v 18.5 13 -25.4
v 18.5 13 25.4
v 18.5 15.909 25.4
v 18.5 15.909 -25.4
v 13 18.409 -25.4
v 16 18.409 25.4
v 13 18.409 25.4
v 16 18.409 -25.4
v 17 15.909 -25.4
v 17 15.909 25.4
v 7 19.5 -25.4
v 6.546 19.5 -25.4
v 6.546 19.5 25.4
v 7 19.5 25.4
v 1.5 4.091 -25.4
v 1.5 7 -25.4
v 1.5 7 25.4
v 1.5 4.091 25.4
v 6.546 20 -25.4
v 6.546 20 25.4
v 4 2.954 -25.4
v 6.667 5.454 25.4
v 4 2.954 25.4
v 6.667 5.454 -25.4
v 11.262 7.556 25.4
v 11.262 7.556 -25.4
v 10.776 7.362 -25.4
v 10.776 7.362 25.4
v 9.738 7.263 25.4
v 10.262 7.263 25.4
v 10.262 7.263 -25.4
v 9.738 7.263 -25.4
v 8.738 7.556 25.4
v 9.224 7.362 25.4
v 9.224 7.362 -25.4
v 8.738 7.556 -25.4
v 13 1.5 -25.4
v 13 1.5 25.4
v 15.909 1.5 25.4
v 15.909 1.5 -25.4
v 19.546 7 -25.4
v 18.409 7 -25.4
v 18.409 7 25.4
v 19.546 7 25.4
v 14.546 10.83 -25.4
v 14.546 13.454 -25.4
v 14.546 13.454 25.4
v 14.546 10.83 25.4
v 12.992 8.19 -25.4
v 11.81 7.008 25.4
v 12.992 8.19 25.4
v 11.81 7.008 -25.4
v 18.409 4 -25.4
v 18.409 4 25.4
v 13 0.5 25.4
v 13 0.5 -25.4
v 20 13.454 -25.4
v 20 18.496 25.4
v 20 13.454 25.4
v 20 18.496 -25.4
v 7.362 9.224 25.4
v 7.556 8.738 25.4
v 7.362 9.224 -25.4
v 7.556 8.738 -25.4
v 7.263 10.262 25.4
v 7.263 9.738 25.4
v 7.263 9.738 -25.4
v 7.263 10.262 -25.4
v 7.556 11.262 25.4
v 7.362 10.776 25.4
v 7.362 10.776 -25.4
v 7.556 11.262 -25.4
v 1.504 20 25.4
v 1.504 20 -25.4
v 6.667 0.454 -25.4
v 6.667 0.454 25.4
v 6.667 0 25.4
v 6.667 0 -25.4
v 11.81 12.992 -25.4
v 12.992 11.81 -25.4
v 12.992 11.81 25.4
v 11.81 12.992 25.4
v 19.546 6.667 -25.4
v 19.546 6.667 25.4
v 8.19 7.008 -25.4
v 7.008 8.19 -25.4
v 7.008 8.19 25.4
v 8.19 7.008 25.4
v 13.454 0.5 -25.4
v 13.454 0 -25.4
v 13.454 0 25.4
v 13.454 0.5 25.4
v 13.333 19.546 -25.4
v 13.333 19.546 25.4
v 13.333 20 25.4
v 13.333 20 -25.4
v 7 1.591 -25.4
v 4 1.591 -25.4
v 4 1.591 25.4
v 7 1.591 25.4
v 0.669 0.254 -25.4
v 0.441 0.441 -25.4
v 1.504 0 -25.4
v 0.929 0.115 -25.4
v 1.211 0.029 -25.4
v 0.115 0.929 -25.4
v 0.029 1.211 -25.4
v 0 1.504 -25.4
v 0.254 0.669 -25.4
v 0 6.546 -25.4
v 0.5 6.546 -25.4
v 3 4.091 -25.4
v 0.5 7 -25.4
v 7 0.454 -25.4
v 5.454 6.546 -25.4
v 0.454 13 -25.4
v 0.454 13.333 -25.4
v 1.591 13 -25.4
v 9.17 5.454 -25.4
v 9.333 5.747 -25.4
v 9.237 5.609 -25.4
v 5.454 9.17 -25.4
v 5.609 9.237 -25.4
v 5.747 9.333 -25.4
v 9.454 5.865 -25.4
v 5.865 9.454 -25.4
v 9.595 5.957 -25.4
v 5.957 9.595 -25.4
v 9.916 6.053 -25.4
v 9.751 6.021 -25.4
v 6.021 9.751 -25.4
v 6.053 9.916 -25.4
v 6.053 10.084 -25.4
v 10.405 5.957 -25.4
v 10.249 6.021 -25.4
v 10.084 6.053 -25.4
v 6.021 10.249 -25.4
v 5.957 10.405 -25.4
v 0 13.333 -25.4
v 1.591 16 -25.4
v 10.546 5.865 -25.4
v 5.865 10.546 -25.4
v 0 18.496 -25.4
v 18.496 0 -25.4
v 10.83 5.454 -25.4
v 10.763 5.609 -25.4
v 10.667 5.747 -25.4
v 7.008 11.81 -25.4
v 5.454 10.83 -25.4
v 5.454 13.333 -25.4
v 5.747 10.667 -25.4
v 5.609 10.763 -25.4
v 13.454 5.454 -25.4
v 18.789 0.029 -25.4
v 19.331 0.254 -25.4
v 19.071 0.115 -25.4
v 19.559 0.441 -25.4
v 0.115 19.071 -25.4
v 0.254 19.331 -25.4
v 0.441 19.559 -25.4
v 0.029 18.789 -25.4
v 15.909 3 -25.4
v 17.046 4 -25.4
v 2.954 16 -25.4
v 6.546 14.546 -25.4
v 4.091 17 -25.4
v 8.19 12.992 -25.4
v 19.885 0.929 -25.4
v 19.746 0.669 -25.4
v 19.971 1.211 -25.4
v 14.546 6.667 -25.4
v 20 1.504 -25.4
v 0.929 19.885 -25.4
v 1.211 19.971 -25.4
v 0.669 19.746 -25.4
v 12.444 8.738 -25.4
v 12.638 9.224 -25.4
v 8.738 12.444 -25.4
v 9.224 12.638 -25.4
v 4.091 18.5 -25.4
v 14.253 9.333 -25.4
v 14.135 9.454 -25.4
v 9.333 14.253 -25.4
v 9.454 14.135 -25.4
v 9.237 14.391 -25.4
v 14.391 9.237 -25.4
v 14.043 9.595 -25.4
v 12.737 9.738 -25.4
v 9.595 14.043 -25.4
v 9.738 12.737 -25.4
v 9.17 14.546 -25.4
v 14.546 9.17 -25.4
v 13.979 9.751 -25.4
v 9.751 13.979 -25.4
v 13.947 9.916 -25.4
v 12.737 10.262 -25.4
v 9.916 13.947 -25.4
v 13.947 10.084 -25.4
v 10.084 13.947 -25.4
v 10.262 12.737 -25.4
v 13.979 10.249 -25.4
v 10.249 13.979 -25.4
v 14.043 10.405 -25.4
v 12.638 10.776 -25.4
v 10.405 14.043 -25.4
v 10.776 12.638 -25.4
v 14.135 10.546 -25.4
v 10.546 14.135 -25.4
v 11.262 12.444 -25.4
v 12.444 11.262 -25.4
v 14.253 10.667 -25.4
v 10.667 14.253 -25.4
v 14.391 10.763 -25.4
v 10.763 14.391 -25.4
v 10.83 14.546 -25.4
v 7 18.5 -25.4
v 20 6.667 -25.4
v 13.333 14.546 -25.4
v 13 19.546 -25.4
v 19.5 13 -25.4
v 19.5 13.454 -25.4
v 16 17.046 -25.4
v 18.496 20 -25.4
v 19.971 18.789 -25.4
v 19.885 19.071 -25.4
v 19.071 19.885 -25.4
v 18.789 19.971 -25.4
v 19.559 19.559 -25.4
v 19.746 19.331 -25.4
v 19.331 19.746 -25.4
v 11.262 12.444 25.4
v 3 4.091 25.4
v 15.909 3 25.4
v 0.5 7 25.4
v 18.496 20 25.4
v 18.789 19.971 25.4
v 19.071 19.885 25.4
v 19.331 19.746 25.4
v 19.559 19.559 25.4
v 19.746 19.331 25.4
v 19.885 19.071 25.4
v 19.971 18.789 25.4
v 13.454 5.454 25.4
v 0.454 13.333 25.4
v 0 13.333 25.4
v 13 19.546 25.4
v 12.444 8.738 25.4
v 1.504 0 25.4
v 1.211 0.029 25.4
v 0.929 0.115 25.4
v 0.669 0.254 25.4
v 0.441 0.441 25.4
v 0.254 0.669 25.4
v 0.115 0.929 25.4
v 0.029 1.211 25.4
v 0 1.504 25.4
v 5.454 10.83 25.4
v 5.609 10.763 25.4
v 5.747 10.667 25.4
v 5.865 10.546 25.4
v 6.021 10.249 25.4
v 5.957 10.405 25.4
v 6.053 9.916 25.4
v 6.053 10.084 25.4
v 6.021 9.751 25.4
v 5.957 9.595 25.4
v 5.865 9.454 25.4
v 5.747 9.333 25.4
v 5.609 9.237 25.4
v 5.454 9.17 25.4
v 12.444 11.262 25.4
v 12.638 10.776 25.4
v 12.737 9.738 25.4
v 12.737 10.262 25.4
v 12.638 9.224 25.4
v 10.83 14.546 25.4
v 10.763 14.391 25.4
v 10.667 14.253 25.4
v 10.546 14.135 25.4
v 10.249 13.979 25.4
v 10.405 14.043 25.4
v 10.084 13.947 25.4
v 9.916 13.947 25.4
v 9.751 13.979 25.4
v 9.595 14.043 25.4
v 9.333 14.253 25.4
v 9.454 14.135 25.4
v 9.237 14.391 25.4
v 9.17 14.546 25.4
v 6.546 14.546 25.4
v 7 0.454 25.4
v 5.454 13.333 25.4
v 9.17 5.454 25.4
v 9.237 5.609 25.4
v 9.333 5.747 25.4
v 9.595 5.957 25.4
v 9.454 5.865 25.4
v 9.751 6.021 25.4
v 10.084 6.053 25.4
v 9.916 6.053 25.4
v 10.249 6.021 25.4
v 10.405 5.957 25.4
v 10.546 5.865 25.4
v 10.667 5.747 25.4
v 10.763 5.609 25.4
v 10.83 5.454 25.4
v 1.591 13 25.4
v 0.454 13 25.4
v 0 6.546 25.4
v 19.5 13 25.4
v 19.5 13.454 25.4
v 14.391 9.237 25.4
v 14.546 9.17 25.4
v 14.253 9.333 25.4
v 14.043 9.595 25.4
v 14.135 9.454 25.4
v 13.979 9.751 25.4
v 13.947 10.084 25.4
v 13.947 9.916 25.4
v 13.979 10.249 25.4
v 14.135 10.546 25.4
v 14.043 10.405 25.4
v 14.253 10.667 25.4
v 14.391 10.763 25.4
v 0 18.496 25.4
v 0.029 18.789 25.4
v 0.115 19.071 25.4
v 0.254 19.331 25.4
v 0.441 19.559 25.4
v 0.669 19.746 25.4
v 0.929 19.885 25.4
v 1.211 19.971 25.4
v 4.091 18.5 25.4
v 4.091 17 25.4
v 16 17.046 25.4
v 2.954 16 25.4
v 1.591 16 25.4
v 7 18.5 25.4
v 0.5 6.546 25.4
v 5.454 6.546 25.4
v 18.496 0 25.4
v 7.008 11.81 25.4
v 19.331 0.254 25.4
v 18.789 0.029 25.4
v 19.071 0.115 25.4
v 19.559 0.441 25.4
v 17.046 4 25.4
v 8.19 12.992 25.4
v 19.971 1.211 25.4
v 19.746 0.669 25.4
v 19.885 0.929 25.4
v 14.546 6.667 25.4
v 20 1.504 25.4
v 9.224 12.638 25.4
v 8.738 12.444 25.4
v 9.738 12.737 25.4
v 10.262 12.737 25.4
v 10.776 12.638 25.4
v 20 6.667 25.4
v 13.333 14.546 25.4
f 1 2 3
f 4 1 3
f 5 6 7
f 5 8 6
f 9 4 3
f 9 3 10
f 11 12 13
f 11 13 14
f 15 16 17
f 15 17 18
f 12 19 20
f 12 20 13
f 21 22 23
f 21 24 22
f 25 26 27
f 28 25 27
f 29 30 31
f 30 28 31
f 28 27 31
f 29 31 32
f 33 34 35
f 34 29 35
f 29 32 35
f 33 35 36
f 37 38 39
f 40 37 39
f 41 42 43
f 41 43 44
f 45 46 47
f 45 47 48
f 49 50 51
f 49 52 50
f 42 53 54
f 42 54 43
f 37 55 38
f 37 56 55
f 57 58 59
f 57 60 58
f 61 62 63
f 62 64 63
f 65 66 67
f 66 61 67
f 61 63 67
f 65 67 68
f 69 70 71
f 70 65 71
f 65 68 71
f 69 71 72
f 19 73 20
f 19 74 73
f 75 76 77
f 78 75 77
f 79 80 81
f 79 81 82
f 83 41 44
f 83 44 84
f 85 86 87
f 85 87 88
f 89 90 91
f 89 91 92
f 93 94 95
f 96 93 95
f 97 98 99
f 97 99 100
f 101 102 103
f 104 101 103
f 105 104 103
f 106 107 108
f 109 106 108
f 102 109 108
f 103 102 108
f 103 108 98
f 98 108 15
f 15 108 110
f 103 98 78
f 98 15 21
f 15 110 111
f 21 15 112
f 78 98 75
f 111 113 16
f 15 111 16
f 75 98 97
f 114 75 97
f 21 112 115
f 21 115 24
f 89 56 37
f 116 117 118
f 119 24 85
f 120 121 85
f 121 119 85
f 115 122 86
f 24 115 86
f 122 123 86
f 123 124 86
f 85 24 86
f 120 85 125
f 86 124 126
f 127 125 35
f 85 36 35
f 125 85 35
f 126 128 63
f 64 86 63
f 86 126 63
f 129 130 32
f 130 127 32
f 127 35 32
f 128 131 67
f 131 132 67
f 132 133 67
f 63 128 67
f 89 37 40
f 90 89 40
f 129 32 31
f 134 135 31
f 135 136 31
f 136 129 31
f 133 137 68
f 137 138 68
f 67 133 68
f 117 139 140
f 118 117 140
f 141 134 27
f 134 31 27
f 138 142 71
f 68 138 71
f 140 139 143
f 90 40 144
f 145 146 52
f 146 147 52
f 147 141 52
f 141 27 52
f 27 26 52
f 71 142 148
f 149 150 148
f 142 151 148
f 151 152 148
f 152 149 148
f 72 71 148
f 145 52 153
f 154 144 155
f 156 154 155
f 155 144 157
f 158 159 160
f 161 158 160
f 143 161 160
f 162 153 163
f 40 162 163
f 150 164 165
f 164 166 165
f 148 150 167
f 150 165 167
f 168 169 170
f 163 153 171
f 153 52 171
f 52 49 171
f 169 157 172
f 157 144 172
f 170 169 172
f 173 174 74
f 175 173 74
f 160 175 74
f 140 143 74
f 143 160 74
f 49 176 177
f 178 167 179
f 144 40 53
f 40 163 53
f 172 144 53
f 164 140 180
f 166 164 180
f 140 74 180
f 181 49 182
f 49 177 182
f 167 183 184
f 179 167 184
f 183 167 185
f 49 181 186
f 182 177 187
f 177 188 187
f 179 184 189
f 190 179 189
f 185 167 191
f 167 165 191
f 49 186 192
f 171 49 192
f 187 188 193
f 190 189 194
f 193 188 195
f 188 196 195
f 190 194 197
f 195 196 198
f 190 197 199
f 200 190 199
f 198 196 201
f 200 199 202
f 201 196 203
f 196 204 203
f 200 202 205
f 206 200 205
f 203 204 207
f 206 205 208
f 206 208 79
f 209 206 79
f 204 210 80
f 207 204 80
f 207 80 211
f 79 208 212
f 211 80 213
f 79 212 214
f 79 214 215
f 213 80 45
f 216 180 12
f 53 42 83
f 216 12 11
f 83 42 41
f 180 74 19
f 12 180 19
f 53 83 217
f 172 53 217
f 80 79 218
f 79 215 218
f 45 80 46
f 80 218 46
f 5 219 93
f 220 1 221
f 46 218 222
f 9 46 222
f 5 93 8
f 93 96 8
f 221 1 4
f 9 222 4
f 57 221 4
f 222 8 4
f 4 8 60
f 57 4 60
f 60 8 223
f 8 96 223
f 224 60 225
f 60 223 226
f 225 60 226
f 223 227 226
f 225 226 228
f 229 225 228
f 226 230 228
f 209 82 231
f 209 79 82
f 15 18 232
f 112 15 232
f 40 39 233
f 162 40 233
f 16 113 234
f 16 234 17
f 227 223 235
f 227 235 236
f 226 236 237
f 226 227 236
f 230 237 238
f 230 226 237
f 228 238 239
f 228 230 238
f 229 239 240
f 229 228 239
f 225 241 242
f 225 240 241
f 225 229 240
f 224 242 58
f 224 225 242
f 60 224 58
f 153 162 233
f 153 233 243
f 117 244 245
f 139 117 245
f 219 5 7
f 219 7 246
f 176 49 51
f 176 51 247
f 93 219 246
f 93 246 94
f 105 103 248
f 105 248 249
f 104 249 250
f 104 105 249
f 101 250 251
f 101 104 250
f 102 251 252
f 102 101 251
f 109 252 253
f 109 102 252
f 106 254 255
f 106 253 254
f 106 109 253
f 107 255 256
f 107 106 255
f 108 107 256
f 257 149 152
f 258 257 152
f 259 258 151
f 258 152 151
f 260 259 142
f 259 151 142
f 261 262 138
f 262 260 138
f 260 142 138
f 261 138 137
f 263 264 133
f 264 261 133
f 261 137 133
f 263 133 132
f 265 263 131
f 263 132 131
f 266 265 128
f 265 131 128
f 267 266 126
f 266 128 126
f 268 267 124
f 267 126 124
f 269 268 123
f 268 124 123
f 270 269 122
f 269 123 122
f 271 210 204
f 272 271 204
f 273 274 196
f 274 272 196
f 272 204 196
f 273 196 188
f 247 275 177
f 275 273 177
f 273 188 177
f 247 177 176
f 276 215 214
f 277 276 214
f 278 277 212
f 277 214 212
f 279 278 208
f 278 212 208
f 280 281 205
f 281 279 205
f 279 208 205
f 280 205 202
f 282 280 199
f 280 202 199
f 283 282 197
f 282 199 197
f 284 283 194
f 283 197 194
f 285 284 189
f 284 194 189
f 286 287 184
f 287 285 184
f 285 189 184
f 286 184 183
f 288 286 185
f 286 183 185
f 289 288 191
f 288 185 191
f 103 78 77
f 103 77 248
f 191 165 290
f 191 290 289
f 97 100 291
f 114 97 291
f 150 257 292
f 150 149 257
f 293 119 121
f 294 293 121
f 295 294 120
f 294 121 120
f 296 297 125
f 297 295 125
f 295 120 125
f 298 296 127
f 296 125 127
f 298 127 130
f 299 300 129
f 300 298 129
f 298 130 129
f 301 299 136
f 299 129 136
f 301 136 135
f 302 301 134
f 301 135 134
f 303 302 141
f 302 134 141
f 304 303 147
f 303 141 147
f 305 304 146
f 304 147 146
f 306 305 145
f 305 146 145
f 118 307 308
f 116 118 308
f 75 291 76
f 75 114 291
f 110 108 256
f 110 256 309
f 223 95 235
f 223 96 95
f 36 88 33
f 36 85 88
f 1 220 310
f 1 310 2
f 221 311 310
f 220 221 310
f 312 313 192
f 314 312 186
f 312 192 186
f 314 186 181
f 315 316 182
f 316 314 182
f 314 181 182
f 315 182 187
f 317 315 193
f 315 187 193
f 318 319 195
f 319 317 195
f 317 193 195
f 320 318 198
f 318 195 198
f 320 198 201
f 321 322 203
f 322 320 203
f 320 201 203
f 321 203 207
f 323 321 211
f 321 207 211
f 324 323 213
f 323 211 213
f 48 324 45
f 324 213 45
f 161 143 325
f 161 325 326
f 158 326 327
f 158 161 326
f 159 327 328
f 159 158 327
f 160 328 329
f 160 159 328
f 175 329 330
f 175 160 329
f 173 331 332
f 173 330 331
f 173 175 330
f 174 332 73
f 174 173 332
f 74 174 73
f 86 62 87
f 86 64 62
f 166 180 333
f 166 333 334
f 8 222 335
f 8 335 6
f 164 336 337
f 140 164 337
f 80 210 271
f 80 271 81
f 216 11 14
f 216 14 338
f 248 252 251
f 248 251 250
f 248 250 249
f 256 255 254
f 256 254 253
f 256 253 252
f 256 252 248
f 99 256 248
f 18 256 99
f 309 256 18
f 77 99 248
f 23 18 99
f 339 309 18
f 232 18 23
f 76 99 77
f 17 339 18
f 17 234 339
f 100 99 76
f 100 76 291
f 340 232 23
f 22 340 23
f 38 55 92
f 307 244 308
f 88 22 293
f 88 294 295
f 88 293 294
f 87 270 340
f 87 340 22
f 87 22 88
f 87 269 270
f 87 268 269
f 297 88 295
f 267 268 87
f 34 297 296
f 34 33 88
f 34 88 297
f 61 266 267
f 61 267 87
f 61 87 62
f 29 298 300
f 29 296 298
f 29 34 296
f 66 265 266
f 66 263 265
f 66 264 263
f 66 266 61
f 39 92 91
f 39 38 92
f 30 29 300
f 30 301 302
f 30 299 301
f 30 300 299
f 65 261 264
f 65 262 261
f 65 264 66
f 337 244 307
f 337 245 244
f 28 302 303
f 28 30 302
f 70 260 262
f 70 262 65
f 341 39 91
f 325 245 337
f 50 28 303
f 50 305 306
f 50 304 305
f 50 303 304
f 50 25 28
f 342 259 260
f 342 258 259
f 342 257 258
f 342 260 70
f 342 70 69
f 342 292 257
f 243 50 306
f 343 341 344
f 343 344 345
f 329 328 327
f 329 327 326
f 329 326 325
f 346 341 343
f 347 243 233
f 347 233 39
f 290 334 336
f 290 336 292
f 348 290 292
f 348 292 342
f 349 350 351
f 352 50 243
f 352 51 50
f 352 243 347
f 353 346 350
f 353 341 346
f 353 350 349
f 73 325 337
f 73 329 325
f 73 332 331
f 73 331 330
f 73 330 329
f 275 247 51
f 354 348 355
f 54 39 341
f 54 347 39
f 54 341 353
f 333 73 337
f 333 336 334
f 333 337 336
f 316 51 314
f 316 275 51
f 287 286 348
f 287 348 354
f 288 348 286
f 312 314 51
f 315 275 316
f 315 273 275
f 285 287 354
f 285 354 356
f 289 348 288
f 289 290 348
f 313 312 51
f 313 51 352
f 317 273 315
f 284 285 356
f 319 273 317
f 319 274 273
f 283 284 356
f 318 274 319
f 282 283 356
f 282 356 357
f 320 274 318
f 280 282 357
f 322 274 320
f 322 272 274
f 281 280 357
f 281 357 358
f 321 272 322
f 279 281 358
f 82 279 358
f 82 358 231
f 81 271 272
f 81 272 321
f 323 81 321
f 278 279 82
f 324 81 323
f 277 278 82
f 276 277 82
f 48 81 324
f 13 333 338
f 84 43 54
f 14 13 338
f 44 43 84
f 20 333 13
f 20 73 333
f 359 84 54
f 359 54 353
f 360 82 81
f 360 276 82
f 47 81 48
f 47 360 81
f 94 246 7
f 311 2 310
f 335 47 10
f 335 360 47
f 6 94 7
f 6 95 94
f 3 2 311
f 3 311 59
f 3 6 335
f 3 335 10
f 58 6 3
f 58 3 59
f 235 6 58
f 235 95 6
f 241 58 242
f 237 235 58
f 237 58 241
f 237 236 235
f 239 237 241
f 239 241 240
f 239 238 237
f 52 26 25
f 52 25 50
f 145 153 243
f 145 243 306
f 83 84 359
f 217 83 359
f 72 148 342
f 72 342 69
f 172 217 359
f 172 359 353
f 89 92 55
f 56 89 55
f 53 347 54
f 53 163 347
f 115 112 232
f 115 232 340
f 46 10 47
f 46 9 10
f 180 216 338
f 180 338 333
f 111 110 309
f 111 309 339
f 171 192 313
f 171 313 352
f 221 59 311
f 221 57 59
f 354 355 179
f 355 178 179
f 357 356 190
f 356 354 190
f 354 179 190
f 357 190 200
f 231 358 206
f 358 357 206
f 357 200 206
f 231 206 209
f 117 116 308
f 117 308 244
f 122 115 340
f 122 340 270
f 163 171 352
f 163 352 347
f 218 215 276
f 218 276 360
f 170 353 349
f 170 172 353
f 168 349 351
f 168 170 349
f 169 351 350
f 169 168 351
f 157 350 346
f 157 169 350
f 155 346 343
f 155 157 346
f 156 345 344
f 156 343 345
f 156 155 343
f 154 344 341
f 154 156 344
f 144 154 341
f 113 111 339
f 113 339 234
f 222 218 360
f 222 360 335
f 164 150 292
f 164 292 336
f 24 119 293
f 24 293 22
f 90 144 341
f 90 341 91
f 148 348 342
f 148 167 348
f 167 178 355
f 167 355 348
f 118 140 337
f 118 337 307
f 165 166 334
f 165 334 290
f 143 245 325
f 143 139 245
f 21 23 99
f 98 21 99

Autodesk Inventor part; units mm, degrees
sketch "Sketch1" plane through (0, 0, 0) normal (0, 0, 1) x (1, 0, 0)
  line L0 (11.2616, 7.5565) -> (11.8104, 7.0077)
  line L1 (11.8104, 7.0077) -> (12.9923, 8.1896)
  line L2 (12.9923, 8.1896) -> (12.4435, 8.7384)
  arc A0 (12.4435, 8.7384) -> (12.4435, 11.2616) centre (10, 10) ccw
  line L3 (12.4435, 11.2616) -> (12.9923, 11.8104)
  line L4 (12.9923, 11.8104) -> (11.8104, 12.9923)
  line L5 (11.8104, 12.9923) -> (11.2616, 12.4435)
  arc A1 (11.2616, 12.4435) -> (8.7384, 12.4435) centre (10, 10) ccw
  line L6 (8.7384, 12.4435) -> (8.1896, 12.9923)
  line L7 (8.1896, 12.9923) -> (7.0077, 11.8104)
  line L8 (7.0077, 11.8104) -> (7.5565, 11.2616)
  arc A2 (7.5565, 11.2616) -> (7.5565, 8.7384) centre (10, 10) ccw
  line L9 (7.5565, 8.7384) -> (7.0077, 8.1896)
  line L10 (7.0077, 8.1896) -> (8.1896, 7.0077)
  line L11 (8.1896, 7.0077) -> (8.7384, 7.5565)
  arc A3 (8.7384, 7.5565) -> (11.2616, 7.5565) centre (10, 10) ccw
  line L12 (13.4545, 0) -> (13.4545, 0.5)
  line L13 (13.4545, 0.5) -> (13, 0.5)
  line L14 (13, 0.5) -> (13, 1.5)
  line L15 (13, 1.5) -> (15.9091, 1.5)
  line L16 (15.9091, 1.5) -> (15.9091, 3)
  line L17 (15.9091, 3) -> (13.4545, 5.4545)
  line L18 (13.4545, 5.4545) -> (10.8302, 5.4545)
  arc A4 (10.8302, 5.4545) -> (9.1698, 5.4545) centre (10, 5.1837) ccw
  line L19 (9.1698, 5.4545) -> (6.6667, 5.4545)
  line L20 (6.6667, 5.4545) -> (4, 2.9545)
  line L21 (4, 2.9545) -> (4, 1.5909)
  line L22 (4, 1.5909) -> (7, 1.5909)
  line L23 (7, 1.5909) -> (7, 0.4545)
  line L24 (7, 0.4545) -> (6.6667, 0.4545)
  line L25 (6.6667, 0.4545) -> (6.6667, 0)
  line L26 (6.6667, 0) -> (1.5043, 0)
  arc A5 (0, 1.5043) -> (1.5043, 0) centre (1.5043, 1.5043) ccw
  line L27 (0, 1.5043) -> (0, 6.5455)
  line L28 (0, 6.5455) -> (0.5, 6.5455)
  line L29 (0.5, 6.5455) -> (0.5, 7)
  line L30 (0.5, 7) -> (1.5, 7)
  line L31 (1.5, 7) -> (1.5, 4.0909)
  line L32 (1.5, 4.0909) -> (3, 4.0909)
  line L33 (3, 4.0909) -> (5.4545, 6.5455)
  line L34 (5.4545, 6.5455) -> (5.4545, 9.1698)
  arc A6 (5.4545, 9.1698) -> (5.4545, 10.8302) centre (5.1837, 10) ccw
  line L35 (5.4545, 10.8302) -> (5.4545, 13.3333)
  line L36 (5.4545, 13.3333) -> (2.9545, 16)
  line L37 (2.9545, 16) -> (1.5909, 16)
  line L38 (1.5909, 16) -> (1.5909, 13)
  line L39 (1.5909, 13) -> (0.4545, 13)
  line L40 (0.4545, 13) -> (0.4545, 13.3333)
  line L41 (0.4545, 13.3333) -> (0, 13.3333)
  line L42 (0, 13.3333) -> (0, 18.4957)
  arc A7 (1.5043, 20) -> (0, 18.4957) centre (1.5043, 18.4957) ccw
  line L43 (1.5043, 20) -> (6.5455, 20)
  line L44 (6.5455, 20) -> (6.5455, 19.5)
  line L45 (6.5455, 19.5) -> (7, 19.5)
  line L46 (7, 19.5) -> (7, 18.5)
  line L47 (7, 18.5) -> (4.0909, 18.5)
  line L48 (4.0909, 18.5) -> (4.0909, 17)
  line L49 (4.0909, 17) -> (6.5455, 14.5455)
  line L50 (6.5455, 14.5455) -> (9.1698, 14.5455)
  arc A8 (9.1698, 14.5455) -> (10.8302, 14.5455) centre (10, 14.8163) ccw
  line L51 (10.8302, 14.5455) -> (13.3333, 14.5455)
  line L52 (13.3333, 14.5455) -> (16, 17.0455)
  line L53 (16, 17.0455) -> (16, 18.4091)
  line L54 (16, 18.4091) -> (13, 18.4091)
  line L55 (13, 18.4091) -> (13, 19.5455)
  line L56 (13, 19.5455) -> (13.3333, 19.5455)
  line L57 (13.3333, 19.5455) -> (13.3333, 20)
  line L58 (13.3333, 20) -> (18.4957, 20)
  arc A9 (20, 18.4957) -> (18.4957, 20) centre (18.4957, 18.4957) ccw
  line L59 (20, 18.4957) -> (20, 13.4545)
  line L60 (20, 13.4545) -> (19.5, 13.4545)
  line L61 (19.5, 13.4545) -> (19.5, 13)
  line L62 (19.5, 13) -> (18.5, 13)
  line L63 (18.5, 13) -> (18.5, 15.9091)
  line L64 (18.5, 15.9091) -> (17, 15.9091)
  line L65 (17, 15.9091) -> (14.5455, 13.4545)
  line L66 (14.5455, 13.4545) -> (14.5455, 10.8302)
  arc A10 (14.5455, 10.8302) -> (14.5455, 9.1698) centre (14.8163, 10) ccw
  line L67 (14.5455, 9.1698) -> (14.5455, 6.6667)
  line L68 (14.5455, 6.6667) -> (17.0455, 4)
  line L69 (17.0455, 4) -> (18.4091, 4)
  line L70 (18.4091, 4) -> (18.4091, 7)
  line L71 (18.4091, 7) -> (19.5455, 7)
  line L72 (19.5455, 7) -> (19.5455, 6.6667)
  line L73 (19.5455, 6.6667) -> (20, 6.6667)
  line L74 (20, 6.6667) -> (20, 1.5043)
  arc A11 (18.4957, 0) -> (20, 1.5043) centre (18.4957, 1.5043) ccw
  line L75 (18.4957, 0) -> (13.4545, 0)
  point P0 (0, 0)
  point P1 (0.4406, 0.4406)
  point P2 (10, 0)
  point P3 (10, 0)
  point P4 (10, 0)
  point P5 (19.5594, 0.4406)
  point P6 (0, 10)
  point P7 (0, 10)
  point P8 (0, 10)
  point P9 (10, 10)
  point P10 (20, 10)
  point P11 (20, 10)
  point P12 (20, 10)
  point P13 (0.4406, 19.5594)
  point P14 (10, 20)
  point P15 (10, 20)
  point P16 (10, 20)
  point P17 (19.5594, 19.5594)
extrude "Extrusion1" add sketch "Sketch1" along normal mid plane 50.8
ref_plane "Work Plane1" through (0, 0, 12.7) normal (0, 0, 1) x (1, 0, 0)
ref_plane "Work Plane2" through (1.5043, 20, 25.4) normal (0, 1, 0) x (1, 0, 0)
ref_plane "Work Plane3" through (10, 13.3333, 25.4) normal (-1, 0, 0) x (0, 0, 1)
properties part number "Verticle support"
